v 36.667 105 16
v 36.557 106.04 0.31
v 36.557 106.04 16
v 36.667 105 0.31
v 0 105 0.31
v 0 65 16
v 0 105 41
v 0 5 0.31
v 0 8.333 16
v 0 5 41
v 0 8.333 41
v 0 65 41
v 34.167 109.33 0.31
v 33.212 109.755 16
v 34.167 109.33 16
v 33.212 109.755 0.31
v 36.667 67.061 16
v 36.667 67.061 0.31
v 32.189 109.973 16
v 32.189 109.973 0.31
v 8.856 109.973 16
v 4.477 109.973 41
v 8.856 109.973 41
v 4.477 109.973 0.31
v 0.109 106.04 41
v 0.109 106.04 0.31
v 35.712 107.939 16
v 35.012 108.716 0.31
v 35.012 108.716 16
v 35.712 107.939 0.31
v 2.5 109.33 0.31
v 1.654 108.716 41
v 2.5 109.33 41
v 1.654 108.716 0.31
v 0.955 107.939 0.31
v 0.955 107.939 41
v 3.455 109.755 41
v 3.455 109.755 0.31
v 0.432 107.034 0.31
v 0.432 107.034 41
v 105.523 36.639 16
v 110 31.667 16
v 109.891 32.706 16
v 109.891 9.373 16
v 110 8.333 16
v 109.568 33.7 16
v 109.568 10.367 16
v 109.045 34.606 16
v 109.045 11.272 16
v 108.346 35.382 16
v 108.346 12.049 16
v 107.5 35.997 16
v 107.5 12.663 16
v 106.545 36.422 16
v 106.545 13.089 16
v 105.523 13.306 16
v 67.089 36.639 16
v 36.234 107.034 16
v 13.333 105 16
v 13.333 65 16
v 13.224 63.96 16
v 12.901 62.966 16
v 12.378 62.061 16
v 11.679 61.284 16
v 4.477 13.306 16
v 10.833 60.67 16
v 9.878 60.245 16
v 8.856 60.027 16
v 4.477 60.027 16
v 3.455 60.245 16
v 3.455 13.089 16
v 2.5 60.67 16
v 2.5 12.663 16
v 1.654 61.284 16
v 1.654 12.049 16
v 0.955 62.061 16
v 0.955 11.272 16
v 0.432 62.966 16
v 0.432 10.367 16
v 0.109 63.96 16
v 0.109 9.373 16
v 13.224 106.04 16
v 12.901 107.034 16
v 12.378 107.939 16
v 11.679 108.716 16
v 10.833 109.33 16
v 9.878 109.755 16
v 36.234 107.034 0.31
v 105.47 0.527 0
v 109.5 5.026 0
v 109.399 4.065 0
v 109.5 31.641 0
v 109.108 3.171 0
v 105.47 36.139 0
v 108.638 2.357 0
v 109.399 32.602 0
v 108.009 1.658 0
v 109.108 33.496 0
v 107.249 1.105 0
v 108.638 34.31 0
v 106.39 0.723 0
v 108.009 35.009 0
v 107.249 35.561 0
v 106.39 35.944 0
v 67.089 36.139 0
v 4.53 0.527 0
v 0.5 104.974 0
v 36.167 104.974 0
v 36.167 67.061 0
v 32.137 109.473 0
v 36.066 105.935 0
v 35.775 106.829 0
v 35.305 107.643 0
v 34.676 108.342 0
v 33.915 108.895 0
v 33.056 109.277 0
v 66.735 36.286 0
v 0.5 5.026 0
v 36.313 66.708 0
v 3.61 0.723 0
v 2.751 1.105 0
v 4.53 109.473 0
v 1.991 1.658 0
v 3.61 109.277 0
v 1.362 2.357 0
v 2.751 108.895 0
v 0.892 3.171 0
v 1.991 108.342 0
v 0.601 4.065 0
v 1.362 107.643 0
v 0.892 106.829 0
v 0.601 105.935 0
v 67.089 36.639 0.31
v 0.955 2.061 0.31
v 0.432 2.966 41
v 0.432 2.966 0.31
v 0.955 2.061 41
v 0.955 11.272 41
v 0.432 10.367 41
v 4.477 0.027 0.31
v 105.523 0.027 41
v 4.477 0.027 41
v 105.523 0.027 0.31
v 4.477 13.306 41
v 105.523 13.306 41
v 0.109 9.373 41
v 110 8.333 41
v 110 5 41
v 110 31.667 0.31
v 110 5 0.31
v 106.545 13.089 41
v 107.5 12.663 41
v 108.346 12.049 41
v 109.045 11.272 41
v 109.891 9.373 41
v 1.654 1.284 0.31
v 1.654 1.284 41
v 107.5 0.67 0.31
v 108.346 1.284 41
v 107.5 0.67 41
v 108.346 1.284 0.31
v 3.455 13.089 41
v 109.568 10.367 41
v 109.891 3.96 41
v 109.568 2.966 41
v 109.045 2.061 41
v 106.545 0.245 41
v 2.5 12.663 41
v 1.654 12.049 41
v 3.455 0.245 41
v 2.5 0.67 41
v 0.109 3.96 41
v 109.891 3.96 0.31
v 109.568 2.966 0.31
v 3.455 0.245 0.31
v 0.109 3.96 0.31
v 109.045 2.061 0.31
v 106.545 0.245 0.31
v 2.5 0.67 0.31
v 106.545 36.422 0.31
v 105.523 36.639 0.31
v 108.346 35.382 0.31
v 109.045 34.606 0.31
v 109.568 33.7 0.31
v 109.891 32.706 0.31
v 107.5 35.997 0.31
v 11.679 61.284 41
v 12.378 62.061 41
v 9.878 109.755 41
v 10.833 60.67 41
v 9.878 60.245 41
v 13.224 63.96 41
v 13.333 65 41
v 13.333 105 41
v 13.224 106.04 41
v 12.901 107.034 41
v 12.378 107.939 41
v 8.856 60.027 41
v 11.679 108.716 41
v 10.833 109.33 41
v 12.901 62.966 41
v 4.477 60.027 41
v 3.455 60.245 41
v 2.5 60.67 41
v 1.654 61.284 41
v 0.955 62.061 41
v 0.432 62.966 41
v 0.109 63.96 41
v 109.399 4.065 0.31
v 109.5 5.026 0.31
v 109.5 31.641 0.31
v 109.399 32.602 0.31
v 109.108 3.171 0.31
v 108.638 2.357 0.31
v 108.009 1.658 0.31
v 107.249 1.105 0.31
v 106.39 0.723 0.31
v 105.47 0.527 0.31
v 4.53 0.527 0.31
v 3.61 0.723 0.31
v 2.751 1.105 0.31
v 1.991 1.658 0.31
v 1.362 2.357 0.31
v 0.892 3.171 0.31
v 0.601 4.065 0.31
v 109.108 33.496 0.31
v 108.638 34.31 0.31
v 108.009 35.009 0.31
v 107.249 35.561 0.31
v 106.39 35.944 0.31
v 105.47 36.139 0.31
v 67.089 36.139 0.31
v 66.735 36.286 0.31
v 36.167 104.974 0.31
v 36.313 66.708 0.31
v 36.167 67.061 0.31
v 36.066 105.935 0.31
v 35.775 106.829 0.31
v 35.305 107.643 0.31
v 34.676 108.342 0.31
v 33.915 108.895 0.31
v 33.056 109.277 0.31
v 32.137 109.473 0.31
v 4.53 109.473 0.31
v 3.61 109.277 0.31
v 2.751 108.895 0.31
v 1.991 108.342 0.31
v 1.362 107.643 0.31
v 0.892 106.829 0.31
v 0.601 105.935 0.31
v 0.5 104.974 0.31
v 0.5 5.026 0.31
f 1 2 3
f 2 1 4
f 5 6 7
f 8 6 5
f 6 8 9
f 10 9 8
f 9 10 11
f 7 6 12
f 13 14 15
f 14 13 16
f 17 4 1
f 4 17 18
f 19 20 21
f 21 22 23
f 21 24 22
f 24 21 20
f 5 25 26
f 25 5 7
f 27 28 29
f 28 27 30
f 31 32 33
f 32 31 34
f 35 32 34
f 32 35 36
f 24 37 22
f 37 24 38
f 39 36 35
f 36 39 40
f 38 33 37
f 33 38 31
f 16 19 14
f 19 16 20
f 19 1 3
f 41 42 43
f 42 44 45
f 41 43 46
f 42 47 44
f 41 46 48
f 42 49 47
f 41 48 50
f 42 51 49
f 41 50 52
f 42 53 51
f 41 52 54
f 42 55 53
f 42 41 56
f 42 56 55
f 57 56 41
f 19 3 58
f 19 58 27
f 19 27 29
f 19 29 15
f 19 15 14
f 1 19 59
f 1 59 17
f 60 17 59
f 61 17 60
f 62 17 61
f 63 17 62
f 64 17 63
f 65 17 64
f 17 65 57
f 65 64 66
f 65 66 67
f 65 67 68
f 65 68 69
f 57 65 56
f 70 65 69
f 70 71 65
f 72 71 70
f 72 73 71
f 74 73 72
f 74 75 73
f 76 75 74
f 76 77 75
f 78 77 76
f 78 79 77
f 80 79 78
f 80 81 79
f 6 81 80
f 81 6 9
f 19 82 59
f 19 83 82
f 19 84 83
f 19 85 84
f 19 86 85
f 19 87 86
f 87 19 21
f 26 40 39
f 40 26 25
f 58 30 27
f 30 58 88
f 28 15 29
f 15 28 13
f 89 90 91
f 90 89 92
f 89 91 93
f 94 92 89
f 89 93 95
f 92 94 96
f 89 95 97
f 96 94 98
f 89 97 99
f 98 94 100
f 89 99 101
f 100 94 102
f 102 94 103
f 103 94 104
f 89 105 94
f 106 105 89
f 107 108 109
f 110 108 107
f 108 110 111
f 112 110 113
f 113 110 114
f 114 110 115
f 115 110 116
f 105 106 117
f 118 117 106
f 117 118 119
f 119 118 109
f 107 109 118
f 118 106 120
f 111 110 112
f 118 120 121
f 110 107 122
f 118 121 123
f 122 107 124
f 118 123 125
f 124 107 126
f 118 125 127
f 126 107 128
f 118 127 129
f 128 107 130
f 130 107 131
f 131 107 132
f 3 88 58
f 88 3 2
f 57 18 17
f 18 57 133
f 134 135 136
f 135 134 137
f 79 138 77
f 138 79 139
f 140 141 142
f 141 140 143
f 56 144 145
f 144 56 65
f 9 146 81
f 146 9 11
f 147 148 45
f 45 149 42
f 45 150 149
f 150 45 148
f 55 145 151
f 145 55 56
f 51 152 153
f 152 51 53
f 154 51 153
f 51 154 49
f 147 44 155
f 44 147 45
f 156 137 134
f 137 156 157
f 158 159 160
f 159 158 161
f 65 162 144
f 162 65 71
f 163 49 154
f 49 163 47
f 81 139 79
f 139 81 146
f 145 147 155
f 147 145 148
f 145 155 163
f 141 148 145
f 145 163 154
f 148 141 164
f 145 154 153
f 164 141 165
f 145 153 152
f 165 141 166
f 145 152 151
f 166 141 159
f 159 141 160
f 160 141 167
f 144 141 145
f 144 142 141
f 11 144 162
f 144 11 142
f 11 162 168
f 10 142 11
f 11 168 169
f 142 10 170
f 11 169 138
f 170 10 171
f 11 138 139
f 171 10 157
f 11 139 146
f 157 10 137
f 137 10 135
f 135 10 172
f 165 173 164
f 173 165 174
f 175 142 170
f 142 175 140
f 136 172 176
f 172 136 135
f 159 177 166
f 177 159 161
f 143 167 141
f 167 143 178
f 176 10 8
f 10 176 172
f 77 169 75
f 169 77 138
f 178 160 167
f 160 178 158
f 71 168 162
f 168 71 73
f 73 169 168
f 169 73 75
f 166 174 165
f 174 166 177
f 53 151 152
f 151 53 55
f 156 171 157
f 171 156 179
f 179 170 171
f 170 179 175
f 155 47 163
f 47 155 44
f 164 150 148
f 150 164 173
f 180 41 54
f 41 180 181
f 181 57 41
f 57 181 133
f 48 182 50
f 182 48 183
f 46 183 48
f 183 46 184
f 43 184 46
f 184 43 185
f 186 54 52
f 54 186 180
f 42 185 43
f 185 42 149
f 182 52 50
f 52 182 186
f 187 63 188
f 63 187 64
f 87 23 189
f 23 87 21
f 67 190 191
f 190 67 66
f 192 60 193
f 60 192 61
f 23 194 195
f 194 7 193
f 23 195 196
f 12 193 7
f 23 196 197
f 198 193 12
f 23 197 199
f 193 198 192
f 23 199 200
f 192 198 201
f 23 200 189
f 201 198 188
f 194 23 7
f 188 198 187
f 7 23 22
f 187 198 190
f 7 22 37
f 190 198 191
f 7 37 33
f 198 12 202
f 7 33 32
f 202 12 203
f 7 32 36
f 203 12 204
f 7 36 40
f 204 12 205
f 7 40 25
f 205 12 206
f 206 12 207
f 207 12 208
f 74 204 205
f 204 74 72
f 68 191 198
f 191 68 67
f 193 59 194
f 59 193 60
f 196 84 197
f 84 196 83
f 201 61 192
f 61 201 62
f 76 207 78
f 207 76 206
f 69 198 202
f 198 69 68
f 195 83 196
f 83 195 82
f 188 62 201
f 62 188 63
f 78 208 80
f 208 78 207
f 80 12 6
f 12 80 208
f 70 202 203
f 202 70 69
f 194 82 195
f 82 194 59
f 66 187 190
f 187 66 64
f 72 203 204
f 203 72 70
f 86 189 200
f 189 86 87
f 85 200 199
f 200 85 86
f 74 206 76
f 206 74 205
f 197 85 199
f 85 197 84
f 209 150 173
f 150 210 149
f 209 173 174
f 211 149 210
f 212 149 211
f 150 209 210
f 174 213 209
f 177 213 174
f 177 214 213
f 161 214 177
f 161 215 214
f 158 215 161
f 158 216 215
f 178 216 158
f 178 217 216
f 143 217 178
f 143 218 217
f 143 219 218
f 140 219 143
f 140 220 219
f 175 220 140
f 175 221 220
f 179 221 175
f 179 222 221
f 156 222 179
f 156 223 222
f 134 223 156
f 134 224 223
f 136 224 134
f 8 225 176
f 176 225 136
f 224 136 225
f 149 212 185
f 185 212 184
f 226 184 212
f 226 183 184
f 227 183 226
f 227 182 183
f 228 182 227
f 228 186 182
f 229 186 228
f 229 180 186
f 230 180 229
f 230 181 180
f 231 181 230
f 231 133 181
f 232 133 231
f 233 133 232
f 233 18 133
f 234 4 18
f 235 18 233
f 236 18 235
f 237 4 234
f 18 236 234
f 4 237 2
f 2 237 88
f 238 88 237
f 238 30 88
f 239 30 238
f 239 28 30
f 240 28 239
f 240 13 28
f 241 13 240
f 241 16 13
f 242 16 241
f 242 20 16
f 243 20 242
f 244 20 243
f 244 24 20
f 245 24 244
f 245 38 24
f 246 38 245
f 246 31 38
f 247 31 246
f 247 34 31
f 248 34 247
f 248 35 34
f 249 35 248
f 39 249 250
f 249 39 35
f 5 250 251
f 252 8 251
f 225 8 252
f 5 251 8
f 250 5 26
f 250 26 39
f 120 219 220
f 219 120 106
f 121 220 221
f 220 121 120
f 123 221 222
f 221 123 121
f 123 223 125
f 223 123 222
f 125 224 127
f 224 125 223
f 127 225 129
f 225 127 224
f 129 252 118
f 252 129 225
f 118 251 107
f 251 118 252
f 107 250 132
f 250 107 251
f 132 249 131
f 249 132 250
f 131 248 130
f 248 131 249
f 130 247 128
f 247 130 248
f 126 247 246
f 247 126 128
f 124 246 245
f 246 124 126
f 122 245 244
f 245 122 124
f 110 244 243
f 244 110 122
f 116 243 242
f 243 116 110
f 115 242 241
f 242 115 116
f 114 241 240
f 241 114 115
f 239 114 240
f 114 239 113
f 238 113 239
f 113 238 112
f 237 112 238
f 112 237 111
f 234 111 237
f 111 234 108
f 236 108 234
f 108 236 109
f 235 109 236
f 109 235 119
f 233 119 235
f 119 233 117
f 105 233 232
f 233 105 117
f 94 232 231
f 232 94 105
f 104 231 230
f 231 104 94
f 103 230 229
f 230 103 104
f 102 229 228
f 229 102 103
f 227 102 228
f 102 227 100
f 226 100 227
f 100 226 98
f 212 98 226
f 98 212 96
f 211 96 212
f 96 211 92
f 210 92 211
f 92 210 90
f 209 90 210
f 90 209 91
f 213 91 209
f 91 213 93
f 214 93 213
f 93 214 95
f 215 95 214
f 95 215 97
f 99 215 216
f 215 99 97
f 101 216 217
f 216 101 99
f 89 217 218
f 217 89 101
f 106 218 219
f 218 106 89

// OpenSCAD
// file: atis_lib.scad
module gyuru(r1, r2,h, w, center=false){
    difference(){
        cylinder(r1=r1,r2=r2,h, center=center, $fn=12*r1);
        cylinder(r1=r1-w, r2=r2-w,h, center=center, $fn=12*(r1-w));
    }
}

//inset_width= min(nozzle dia/2, 0.4)
module inset_first_layer(inset_height=0.31,inset_width=0.2, render=false)
{   
    if (render == true){
        difference()
        { 
            children();

            translate([0,0,-1])
            linear_extrude(height=inset_height+1)
            difference()
            {
                offset(r = inset_width) 
                projection(cut=true) 
                translate([0,0,-inset_height])
                children();

                offset(r = -inset_width) 
                projection(cut=true) 
                translate([0,0,-inset_height])
                children();
            }
        } 
    }
    else{
        echo("Inset not rendered!");
    }
} 

module deszka(m, sz, v, cimke){
    cube([m,sz,v], center=true);
    if (m == vastagsag){
        t = sz * v;
        echo(cimke, m , sz, v, t/1000/1000);
    }
    if (sz == vastagsag){
        t = m*v;
        echo(cimke, m , sz, v, t/1000/1000);
    }
    if (v == vastagsag){
        t = m*sz;
        echo(cimke, m , sz, v, t/1000/1000);
    }
    //echo(cimke, m , sz, v, t);
}
// main file
use <atis_lib.scad>;


// ezeket a méreteket nyomtattam a CB-vel.
//kulso_meret=170; 
//belso_kivagas=107;
//L_szelesseg=40;
//oldalfal_vastagsag=10;
//magassag=60;

kulso_meret=100; 
belso_kivagas=60;
magassag=40;
oldalfal_vastagsag=magassag/3-10;
L_szelesseg=magassag/3*2;

pontok=[[0,0],
        [kulso_meret,0],
        [kulso_meret,L_szelesseg],
        [belso_kivagas,L_szelesseg],
        [L_szelesseg,belso_kivagas],
        [L_szelesseg,kulso_meret],
        [0,kulso_meret],
        [0,0]];

/*minkowski(){
    square(20,20);
    circle(r=5);
}*/

sarok2();

module sarok(){
// BB-hez ezt kell kitörölni.     
inset_first_layer(inset_height=0.31, inset_width=0.5, render=true)     
    translate([5,5,0])linear_extrude(height=30)        
        difference(){
            minkowski(){
                polygon(pontok);
                circle(r=2.5, $fn=5*12);
            }
            translate([70,30,0])square([40,30]);
            translate([30,70,0])square([30,40]);
        }
}

module sarok2(){
// BB-hez ezt kell kitörölni.     
    inset_first_layer(inset_height=0.31, inset_width=0.5, render=true) 
        difference(){
            translate([5,5,0])
                minkowski(){
                    union(){
                        translate([0,0,0])linear_extrude(height=15) polygon(pontok);
                        cube([kulso_meret,oldalfal_vastagsag,magassag]);
                        translate([0,60,0])cube([oldalfal_vastagsag,kulso_meret-60,magassag]);
                    }
                    cylinder(r=5, $fn=30);
                } //Minkowski
                // Lyukasztgatás nem éri meg: 118/105 x több anyagot használ és 2 órával tovább tart a nyomtatás is.
            /*for(x =[10:15:170]){
                for(y = [10:15:170]){
                    translate([x,y,0])cylinder(r=4, h = 70);
                }
            }*/
        }
}

alacsony_y = 2*(1-35/180);
ek_pontok = [[0,0],
             [0,2],
             [35, alacsony_y],
             [35,0],
             [0,0]];

module KorFureszEk(){
    difference(){
        linear_extrude(height=50) polygon(ek_pontok);
        translate([15,1.5,40])rotate([0,90,0])rotate([-90,0,0])linear_extrude(height=20) #text ("teteje");
    }
}
